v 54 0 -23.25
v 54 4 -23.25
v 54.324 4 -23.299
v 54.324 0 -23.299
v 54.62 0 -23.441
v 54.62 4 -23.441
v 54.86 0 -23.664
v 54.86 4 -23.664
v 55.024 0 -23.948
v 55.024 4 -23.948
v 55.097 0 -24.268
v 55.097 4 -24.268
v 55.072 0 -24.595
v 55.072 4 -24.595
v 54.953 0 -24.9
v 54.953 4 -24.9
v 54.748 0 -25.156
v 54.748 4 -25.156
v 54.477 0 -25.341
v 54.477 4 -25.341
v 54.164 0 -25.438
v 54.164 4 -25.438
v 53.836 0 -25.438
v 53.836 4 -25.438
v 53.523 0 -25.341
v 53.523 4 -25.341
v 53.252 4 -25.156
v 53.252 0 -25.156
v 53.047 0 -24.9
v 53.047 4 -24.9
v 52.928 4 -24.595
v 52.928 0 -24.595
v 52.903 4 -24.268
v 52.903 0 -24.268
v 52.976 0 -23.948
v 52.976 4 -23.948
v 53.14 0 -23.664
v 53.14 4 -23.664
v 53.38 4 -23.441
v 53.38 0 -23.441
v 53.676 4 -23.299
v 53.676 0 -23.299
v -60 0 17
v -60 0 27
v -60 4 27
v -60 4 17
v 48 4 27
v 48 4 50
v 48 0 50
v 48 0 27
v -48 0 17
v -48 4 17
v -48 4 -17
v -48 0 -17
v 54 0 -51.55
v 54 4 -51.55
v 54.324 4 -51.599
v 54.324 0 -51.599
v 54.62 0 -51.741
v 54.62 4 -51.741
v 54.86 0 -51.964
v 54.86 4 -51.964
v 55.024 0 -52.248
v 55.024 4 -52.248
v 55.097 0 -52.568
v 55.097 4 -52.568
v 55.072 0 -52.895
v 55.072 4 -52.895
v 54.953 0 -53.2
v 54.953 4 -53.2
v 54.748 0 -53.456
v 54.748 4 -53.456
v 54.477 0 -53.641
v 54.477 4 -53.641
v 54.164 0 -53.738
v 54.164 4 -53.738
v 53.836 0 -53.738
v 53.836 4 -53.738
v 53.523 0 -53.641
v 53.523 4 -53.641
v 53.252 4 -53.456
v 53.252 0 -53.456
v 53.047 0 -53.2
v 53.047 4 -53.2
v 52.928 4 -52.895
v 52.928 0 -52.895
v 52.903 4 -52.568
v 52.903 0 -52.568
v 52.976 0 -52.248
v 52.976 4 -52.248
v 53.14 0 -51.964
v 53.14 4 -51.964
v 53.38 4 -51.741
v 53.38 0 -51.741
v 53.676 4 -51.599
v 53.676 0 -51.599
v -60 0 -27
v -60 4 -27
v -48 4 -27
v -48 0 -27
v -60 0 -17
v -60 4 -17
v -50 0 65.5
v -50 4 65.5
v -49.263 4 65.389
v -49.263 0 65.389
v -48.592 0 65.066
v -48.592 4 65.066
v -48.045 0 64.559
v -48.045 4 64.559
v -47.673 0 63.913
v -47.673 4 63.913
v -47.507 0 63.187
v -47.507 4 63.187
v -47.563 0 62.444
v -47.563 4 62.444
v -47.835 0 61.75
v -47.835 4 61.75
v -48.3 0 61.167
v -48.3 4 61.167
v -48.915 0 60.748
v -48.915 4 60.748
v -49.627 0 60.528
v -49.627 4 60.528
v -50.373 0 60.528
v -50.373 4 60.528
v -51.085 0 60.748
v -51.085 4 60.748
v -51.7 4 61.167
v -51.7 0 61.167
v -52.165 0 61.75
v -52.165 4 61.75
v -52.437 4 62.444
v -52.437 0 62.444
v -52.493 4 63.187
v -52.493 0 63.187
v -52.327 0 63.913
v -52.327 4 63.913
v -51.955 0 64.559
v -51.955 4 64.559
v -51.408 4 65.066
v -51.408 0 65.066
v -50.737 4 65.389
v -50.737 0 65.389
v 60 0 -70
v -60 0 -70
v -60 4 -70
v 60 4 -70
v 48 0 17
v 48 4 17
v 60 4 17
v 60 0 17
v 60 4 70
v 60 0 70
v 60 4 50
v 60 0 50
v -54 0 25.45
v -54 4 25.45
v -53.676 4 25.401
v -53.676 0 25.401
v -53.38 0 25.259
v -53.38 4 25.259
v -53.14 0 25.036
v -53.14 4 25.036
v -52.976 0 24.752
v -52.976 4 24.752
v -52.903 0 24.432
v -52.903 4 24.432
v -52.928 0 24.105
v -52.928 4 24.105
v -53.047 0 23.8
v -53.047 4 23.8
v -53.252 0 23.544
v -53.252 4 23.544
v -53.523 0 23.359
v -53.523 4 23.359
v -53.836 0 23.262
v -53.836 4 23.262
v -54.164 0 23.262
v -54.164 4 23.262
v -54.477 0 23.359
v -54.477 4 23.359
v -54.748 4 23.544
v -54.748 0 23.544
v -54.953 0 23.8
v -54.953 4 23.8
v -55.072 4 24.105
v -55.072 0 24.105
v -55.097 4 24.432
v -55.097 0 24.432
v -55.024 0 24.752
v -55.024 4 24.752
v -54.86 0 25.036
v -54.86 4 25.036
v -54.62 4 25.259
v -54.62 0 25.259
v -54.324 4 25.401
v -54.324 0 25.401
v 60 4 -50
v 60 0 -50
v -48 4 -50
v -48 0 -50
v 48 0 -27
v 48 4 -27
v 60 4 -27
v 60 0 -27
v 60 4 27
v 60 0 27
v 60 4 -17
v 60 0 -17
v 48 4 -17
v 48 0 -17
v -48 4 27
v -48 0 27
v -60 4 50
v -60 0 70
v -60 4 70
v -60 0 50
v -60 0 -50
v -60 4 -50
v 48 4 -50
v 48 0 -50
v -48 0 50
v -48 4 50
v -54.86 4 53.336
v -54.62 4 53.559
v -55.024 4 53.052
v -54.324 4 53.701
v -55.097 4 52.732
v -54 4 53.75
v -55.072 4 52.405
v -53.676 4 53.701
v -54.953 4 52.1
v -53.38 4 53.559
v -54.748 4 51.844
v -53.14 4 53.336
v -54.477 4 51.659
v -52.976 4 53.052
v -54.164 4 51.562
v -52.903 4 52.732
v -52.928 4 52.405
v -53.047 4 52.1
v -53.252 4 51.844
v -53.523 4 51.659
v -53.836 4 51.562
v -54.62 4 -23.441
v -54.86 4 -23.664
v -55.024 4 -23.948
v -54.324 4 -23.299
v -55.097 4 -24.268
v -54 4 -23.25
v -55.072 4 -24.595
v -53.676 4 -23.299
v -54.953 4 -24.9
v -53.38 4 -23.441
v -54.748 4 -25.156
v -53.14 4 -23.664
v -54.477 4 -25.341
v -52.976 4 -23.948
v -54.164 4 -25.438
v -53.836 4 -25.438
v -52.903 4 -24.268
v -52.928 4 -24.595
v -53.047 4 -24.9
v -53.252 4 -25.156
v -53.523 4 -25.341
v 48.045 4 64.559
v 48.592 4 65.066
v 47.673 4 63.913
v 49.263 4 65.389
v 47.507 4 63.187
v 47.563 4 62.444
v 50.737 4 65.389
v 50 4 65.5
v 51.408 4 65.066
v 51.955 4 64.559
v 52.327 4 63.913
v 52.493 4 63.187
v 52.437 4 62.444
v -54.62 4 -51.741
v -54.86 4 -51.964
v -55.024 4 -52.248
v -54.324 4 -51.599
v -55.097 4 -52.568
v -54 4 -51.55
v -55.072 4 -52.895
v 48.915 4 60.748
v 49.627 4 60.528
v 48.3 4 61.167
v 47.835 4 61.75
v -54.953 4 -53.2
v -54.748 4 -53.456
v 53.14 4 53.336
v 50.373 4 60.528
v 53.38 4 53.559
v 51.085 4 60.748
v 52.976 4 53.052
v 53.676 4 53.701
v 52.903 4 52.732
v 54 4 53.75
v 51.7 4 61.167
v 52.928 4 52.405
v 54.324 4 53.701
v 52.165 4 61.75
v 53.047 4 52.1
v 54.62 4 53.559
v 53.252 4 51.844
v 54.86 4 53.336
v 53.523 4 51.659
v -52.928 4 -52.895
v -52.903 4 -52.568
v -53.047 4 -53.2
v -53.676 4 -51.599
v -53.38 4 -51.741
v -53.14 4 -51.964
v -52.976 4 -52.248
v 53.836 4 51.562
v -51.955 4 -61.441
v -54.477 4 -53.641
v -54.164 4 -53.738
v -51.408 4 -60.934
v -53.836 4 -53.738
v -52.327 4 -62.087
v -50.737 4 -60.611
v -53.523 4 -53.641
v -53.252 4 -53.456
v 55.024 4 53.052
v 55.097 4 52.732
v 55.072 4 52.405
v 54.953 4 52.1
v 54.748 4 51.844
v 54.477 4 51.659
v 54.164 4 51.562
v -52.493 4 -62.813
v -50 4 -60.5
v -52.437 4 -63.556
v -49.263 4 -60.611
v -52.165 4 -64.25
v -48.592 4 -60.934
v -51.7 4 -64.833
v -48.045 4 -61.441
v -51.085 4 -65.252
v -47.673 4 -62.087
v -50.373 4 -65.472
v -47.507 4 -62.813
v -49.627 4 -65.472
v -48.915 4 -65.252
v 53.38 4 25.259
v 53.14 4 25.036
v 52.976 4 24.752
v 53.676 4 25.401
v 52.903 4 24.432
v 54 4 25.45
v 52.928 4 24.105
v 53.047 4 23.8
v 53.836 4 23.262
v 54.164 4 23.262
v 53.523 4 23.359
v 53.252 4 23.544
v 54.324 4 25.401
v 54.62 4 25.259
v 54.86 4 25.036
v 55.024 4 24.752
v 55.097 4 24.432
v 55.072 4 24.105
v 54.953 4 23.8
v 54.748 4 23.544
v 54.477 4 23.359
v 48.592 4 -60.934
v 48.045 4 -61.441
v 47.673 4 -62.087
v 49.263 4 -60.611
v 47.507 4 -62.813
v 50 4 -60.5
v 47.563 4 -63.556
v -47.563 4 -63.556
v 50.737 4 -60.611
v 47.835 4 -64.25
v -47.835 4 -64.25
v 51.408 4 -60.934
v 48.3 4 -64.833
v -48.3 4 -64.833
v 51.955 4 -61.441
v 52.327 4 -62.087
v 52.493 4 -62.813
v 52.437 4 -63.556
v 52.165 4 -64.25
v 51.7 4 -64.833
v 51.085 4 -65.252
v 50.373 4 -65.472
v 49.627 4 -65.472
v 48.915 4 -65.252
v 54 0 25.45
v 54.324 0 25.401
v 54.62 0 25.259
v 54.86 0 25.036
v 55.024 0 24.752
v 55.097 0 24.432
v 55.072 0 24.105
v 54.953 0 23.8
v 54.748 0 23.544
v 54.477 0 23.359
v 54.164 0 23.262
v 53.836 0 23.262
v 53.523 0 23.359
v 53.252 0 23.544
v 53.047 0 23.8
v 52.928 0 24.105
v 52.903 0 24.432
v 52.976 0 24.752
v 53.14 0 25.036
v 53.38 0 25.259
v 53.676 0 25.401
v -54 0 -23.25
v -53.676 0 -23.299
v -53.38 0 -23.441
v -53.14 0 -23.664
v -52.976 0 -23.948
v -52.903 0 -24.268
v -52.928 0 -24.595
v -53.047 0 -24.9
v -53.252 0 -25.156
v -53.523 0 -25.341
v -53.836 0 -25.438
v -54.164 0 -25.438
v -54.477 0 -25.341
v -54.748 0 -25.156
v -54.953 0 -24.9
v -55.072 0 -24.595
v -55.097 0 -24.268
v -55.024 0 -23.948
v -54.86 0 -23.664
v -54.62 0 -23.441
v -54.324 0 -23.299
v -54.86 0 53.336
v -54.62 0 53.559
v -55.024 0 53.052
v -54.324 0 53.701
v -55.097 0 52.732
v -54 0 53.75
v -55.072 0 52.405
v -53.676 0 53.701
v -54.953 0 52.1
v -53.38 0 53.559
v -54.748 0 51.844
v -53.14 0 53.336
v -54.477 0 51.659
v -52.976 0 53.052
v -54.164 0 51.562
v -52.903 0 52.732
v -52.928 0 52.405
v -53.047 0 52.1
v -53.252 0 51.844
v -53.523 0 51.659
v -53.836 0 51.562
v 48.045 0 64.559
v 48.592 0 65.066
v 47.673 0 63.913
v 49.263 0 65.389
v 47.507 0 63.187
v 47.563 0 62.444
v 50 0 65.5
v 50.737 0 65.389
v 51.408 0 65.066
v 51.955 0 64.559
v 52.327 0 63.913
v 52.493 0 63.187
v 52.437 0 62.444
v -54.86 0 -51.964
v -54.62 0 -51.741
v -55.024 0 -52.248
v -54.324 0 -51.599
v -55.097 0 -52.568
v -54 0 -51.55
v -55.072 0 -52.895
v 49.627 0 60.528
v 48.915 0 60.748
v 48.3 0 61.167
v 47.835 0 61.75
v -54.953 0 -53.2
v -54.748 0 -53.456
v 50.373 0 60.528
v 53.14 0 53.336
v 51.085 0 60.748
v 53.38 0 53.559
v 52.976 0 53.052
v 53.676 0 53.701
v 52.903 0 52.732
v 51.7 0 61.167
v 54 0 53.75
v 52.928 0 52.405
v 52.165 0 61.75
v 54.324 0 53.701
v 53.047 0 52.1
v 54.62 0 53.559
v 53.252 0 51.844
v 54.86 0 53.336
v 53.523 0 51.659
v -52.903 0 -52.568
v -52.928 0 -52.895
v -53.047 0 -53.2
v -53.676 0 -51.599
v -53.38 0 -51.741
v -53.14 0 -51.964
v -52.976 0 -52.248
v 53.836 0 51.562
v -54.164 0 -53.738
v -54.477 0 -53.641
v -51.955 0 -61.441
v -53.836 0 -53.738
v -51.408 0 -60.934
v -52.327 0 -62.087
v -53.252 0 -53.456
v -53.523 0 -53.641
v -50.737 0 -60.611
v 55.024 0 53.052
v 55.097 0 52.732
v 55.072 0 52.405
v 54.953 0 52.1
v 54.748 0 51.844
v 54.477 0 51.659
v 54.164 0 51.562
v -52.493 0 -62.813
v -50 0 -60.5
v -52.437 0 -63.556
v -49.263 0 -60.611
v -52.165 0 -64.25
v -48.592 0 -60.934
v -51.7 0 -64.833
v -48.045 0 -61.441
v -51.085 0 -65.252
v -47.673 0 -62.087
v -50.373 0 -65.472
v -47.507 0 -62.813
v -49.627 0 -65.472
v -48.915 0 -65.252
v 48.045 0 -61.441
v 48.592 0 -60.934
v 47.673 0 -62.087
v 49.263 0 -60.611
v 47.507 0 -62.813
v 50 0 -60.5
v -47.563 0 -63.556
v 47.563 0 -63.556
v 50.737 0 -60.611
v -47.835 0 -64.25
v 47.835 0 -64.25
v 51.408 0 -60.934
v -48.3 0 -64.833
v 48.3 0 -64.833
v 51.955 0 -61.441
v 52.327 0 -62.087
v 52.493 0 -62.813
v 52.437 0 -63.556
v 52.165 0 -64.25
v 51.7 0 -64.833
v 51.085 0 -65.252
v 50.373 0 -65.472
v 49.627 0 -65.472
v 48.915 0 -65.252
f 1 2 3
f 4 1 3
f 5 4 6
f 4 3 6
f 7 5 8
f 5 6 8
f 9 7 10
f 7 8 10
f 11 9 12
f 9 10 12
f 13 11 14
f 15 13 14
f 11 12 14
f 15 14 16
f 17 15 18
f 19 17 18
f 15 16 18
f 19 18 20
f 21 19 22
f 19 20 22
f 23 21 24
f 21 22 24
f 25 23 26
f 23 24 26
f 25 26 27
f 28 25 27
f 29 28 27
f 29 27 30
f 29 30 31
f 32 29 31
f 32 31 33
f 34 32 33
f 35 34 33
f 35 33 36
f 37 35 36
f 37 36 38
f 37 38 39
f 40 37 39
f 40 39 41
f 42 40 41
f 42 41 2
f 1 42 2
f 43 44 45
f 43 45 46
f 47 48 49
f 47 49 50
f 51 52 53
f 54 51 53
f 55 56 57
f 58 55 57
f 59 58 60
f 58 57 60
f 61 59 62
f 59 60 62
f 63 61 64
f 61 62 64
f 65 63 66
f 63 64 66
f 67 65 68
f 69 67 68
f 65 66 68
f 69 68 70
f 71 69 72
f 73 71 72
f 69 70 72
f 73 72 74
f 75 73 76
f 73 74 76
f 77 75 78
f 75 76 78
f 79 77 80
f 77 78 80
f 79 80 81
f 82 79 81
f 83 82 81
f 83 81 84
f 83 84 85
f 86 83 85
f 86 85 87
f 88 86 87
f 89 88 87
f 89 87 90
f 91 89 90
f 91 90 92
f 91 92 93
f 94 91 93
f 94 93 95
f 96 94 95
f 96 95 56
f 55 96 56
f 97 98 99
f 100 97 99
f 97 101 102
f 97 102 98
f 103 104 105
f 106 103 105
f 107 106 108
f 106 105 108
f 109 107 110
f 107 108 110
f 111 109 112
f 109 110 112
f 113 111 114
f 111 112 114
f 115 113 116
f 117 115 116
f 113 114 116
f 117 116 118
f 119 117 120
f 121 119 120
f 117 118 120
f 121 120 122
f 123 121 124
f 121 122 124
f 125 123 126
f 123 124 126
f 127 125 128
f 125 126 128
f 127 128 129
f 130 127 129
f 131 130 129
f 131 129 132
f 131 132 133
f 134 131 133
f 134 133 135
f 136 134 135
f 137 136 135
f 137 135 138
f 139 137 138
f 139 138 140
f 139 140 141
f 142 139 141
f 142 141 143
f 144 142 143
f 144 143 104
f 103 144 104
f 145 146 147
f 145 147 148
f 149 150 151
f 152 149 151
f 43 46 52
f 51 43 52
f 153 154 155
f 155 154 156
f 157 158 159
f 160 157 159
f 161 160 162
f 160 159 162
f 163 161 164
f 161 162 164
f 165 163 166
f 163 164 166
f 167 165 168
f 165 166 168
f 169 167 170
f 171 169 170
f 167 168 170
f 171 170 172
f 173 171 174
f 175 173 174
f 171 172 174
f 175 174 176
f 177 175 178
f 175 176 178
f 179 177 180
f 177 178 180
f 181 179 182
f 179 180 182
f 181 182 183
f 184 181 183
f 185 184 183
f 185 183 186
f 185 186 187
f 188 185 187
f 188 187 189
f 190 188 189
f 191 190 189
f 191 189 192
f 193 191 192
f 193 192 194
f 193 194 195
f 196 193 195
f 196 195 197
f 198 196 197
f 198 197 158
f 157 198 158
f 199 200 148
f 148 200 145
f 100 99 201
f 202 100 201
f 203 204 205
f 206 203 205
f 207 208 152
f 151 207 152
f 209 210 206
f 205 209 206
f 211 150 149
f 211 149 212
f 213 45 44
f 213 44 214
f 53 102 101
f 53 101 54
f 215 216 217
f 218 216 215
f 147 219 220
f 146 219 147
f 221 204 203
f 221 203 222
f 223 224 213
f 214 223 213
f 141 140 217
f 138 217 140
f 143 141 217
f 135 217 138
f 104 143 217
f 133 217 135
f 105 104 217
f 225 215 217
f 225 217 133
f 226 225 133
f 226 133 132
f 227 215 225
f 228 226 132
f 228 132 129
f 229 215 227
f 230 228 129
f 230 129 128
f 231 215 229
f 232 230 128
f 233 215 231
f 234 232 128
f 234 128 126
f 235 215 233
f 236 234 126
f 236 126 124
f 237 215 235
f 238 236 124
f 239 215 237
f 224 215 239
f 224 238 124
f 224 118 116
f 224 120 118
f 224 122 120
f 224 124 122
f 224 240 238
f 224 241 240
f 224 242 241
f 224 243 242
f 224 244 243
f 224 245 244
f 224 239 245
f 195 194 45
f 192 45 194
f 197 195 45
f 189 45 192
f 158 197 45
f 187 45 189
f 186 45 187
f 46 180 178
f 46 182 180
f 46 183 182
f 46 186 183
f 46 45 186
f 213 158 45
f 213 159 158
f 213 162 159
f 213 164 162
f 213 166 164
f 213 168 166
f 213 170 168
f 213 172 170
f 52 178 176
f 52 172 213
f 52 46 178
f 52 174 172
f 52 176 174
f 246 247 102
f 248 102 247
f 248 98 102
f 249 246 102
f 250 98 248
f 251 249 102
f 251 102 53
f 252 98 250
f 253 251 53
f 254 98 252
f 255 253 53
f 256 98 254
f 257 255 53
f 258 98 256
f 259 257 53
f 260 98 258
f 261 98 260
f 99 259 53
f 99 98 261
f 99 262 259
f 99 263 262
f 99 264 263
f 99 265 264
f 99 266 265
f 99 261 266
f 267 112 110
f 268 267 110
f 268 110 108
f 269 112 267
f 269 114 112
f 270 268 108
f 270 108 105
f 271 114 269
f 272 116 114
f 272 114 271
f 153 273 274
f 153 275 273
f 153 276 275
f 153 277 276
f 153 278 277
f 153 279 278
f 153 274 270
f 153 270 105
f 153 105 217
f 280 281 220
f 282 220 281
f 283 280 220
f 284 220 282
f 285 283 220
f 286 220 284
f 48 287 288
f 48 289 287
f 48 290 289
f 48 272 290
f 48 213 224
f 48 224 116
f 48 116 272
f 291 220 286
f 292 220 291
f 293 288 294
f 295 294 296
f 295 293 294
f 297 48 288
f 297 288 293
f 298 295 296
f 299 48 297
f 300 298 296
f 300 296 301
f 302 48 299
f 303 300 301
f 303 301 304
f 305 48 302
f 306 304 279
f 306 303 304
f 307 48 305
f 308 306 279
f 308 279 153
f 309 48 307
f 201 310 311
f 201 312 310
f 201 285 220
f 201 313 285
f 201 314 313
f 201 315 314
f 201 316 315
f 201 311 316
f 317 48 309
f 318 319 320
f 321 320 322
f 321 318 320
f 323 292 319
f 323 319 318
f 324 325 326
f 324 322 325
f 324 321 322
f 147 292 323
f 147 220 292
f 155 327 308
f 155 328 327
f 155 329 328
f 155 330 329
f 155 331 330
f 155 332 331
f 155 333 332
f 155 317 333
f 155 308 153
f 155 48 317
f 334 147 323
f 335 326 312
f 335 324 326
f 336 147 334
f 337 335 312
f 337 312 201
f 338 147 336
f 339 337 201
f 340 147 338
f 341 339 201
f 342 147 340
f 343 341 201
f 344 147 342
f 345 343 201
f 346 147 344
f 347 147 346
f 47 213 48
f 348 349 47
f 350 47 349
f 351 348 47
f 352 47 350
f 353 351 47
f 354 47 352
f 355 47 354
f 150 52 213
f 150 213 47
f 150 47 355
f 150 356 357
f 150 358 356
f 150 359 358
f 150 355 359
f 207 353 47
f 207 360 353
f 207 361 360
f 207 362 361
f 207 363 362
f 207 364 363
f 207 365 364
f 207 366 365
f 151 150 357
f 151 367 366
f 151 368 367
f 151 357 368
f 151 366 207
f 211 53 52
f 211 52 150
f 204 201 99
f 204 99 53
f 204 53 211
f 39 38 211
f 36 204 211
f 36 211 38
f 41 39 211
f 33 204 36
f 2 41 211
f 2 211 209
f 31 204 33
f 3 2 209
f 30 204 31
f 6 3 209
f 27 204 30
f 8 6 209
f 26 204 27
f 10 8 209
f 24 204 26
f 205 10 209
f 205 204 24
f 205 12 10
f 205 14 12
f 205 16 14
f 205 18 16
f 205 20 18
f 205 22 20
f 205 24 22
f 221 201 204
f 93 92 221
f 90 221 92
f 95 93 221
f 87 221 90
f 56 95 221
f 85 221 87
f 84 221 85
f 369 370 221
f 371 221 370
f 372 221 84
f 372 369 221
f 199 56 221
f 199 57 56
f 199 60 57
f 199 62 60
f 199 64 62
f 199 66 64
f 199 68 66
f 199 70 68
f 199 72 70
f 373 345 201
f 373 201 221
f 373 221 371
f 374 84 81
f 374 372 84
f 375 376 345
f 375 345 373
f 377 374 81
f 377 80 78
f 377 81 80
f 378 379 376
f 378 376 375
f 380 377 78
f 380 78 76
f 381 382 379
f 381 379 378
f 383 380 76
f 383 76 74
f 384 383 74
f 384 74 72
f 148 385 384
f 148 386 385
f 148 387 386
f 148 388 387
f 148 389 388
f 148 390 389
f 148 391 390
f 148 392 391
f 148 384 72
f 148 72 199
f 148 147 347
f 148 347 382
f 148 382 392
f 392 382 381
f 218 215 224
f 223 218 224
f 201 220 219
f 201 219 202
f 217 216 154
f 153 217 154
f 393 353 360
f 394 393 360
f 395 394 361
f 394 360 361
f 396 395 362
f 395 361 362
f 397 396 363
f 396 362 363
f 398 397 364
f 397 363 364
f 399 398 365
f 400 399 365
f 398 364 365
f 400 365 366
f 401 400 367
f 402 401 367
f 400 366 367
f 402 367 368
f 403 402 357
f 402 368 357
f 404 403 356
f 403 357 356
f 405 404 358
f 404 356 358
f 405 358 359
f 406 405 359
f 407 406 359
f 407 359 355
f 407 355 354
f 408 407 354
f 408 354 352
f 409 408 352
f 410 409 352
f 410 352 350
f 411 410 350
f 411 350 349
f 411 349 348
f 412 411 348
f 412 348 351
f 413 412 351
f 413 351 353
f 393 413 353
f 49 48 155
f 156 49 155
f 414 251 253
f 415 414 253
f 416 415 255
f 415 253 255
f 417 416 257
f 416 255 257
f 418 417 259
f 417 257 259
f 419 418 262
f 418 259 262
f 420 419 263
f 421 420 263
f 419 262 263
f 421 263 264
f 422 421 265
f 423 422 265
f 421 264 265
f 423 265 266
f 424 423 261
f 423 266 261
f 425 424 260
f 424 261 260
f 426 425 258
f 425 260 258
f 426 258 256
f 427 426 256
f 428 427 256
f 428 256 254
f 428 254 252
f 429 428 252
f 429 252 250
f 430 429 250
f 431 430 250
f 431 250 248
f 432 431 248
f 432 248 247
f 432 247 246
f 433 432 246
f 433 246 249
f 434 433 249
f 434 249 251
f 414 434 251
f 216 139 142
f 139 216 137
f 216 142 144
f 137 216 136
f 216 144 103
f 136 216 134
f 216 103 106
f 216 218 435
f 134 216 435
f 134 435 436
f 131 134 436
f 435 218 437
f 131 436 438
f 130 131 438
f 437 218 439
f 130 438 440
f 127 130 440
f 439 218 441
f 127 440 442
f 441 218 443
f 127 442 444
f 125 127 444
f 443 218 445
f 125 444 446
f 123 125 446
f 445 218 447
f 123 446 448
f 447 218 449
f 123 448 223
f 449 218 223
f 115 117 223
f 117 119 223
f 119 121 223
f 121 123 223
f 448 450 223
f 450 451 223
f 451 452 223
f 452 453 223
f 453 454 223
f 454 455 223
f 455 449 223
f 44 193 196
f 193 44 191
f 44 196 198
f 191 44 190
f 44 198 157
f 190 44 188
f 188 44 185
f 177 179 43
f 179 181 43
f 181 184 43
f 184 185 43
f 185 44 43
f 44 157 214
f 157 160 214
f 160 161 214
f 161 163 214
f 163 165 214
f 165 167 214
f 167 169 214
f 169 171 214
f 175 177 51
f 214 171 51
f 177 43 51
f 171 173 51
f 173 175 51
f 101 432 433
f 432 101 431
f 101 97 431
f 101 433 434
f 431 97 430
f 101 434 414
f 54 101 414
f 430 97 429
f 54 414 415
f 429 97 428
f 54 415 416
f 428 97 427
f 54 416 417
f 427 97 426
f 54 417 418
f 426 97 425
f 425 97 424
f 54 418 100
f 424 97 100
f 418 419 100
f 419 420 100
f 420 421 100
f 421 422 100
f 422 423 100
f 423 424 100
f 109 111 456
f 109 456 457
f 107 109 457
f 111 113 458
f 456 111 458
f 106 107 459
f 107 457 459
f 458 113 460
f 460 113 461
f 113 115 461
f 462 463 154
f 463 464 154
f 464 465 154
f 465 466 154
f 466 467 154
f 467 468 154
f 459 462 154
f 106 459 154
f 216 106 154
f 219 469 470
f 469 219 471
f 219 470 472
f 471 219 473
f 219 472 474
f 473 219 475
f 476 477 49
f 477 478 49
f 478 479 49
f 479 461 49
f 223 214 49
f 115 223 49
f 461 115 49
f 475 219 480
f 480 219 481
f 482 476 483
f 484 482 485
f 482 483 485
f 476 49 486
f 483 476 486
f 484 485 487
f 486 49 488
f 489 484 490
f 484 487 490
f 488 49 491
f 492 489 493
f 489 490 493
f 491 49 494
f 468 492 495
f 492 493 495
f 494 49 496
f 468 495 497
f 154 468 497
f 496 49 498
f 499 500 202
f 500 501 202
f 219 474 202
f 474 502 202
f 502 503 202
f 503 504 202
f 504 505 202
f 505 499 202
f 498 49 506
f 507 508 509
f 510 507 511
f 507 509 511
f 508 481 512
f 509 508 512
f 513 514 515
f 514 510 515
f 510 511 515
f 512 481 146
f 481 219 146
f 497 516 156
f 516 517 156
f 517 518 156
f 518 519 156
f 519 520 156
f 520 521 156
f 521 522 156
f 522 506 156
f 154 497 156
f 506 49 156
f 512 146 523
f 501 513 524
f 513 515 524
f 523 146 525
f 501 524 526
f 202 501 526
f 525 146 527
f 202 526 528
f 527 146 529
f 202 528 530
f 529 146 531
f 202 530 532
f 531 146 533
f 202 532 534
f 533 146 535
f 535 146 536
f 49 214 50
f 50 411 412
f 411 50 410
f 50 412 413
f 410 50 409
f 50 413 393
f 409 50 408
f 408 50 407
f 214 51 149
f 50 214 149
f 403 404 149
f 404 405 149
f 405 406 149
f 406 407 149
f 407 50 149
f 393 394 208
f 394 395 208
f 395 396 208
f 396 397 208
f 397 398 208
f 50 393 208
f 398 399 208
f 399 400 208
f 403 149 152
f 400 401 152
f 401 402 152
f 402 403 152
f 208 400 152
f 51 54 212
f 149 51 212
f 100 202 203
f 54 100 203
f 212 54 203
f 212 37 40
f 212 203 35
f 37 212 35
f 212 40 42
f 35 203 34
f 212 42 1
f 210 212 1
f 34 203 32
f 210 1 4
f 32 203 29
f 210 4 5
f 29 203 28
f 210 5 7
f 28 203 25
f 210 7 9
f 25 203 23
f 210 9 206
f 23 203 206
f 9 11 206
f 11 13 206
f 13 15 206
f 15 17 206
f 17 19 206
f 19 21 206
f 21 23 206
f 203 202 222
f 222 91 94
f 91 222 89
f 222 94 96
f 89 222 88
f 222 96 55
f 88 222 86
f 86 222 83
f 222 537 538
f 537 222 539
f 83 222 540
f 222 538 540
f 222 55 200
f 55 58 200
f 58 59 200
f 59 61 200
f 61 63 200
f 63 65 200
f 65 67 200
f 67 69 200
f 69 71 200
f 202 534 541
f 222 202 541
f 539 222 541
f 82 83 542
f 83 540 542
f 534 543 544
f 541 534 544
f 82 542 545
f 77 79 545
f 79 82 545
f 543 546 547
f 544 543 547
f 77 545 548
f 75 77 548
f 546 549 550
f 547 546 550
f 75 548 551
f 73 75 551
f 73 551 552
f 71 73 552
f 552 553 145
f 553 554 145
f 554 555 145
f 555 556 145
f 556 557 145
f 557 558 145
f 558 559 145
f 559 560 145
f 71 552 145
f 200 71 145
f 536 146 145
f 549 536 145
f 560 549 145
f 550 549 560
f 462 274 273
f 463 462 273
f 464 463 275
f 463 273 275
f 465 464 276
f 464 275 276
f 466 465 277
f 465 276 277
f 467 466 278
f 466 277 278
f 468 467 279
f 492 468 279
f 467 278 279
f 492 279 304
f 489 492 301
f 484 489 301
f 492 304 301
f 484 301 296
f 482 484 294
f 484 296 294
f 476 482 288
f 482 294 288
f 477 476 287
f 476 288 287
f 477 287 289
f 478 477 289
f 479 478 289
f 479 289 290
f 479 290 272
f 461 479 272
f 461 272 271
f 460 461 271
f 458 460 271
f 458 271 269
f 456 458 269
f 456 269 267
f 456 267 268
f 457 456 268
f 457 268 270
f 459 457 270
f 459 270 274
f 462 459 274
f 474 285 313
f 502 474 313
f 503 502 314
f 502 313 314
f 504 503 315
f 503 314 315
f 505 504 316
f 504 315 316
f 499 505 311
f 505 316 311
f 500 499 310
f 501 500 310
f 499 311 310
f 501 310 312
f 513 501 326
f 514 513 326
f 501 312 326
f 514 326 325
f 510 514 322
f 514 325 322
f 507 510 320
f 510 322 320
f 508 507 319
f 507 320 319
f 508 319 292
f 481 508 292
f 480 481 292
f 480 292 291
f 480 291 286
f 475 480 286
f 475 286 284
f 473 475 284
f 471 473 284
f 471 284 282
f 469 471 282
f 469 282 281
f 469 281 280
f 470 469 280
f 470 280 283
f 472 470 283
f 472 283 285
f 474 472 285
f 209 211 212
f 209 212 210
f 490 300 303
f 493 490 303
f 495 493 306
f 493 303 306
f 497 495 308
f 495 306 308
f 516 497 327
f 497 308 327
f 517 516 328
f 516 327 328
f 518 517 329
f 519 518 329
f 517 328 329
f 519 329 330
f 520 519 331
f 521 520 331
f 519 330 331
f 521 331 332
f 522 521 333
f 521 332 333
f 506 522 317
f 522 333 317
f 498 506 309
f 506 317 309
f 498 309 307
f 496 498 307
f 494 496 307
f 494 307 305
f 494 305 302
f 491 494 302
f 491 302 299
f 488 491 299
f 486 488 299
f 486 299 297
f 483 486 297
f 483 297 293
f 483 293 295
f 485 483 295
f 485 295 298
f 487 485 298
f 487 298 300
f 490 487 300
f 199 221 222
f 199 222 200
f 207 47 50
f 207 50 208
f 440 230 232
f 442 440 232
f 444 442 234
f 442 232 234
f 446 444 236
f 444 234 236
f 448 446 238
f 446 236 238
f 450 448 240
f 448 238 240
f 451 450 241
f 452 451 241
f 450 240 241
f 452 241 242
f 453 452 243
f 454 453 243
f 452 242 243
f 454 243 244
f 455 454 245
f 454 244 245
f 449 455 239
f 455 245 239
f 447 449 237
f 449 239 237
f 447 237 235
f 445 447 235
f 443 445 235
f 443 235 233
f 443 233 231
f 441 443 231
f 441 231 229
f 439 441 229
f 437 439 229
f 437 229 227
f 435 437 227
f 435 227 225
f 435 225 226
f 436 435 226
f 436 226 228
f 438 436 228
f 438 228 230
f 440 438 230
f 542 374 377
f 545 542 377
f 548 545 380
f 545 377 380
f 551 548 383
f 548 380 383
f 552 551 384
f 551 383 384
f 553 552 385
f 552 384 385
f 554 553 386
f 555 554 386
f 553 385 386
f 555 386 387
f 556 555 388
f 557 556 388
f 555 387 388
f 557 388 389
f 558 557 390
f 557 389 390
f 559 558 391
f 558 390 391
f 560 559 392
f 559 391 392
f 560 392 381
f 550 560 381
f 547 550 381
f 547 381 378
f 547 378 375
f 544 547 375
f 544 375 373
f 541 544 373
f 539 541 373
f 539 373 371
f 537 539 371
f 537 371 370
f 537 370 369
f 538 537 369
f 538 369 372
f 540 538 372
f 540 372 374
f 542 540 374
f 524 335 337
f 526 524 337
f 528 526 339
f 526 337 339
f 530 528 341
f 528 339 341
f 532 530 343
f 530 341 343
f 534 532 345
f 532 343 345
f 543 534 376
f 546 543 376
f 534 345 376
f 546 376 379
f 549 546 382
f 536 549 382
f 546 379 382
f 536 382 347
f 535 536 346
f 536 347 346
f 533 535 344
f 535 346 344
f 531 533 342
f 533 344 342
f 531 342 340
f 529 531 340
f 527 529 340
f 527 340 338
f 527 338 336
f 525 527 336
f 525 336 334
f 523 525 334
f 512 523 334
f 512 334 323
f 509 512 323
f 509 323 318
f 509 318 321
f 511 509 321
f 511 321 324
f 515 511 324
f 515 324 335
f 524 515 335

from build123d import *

# Parameters (mm, degrees)
SKETCH1_W           = 120
SKETCH1_H           = 140
BOSS_EXTRUDE1_DEPTH = 4
SKETCH2_W           = 12
SKETCH2_H           = 23
SKETCH2_H_2         = 34
SKETCH2_R           = 1.1
SKETCH2_R_2         = 2.5
CUT_EXTRUDE1_DEPTH  = 93.28217596


with BuildPart() as part:
    # Sketch1 → Boss-Extrude1 (new body)
    with BuildSketch(Plane(origin=(0, 0, 0), x_dir=(1, 0, 0), z_dir=(0, 1, 0))):
        Rectangle(SKETCH1_W, SKETCH1_H)
    extrude(amount=BOSS_EXTRUDE1_DEPTH)

    # Sketch2 → Cut-Extrude1 (cut, through all)
    with BuildSketch(Plane(origin=(0, 4, 0), x_dir=(1, 0, 0), z_dir=(0, 1, 0))):
        with Locations((54, 38.5)):
            Rectangle(SKETCH2_W, SKETCH2_H)
        with Locations((-54, 38.5)):
            Rectangle(SKETCH2_W, SKETCH2_H)
        with Locations((54, -38.5)):
            Rectangle(SKETCH2_W, SKETCH2_H)
        with Locations((-54, -38.5)):
            Rectangle(SKETCH2_W, SKETCH2_H)
        with Locations((-54, 0)):
            Rectangle(SKETCH2_W, SKETCH2_H_2)
        with Locations((54, 0)):
            Rectangle(SKETCH2_W, SKETCH2_H_2)
        with Locations(Location((-54, 52.65, 0), (0, 0, 270))):
            Circle(SKETCH2_R)
        with Locations(Location((-54, 24.35, 0), (0, 0, 270))):
            Circle(SKETCH2_R)
        with Locations(Location((-54, -24.35, 0), (0, 0, 270))):
            Circle(SKETCH2_R)
        with Locations(Location((-54, -52.65, 0), (0, 0, 270))):
            Circle(SKETCH2_R)
        with Locations(Location((54, 52.65, 0), (0, 0, 270))):
            Circle(SKETCH2_R)
        with Locations(Location((54, 24.35, 0), (0, 0, 270))):
            Circle(SKETCH2_R)
        with Locations(Location((54, -24.35, 0), (0, 0, 270))):
            Circle(SKETCH2_R)
        with Locations(Location((54, -52.65, 0), (0, 0, 270))):
            Circle(SKETCH2_R)
        with Locations(Location((-50, 63, 0), (0, 0, 270))):
            Circle(SKETCH2_R_2)
        with Locations(Location((50, 63, 0), (0, 0, 270))):
            Circle(SKETCH2_R_2)
        with Locations(Location((50, -63, 0), (0, 0, 270))):
            Circle(SKETCH2_R_2)
        with Locations(Location((-50, -63, 0), (0, 0, 270))):
            Circle(SKETCH2_R_2)
    extrude(amount=-CUT_EXTRUDE1_DEPTH, mode=Mode.SUBTRACT)


solid = part.part
